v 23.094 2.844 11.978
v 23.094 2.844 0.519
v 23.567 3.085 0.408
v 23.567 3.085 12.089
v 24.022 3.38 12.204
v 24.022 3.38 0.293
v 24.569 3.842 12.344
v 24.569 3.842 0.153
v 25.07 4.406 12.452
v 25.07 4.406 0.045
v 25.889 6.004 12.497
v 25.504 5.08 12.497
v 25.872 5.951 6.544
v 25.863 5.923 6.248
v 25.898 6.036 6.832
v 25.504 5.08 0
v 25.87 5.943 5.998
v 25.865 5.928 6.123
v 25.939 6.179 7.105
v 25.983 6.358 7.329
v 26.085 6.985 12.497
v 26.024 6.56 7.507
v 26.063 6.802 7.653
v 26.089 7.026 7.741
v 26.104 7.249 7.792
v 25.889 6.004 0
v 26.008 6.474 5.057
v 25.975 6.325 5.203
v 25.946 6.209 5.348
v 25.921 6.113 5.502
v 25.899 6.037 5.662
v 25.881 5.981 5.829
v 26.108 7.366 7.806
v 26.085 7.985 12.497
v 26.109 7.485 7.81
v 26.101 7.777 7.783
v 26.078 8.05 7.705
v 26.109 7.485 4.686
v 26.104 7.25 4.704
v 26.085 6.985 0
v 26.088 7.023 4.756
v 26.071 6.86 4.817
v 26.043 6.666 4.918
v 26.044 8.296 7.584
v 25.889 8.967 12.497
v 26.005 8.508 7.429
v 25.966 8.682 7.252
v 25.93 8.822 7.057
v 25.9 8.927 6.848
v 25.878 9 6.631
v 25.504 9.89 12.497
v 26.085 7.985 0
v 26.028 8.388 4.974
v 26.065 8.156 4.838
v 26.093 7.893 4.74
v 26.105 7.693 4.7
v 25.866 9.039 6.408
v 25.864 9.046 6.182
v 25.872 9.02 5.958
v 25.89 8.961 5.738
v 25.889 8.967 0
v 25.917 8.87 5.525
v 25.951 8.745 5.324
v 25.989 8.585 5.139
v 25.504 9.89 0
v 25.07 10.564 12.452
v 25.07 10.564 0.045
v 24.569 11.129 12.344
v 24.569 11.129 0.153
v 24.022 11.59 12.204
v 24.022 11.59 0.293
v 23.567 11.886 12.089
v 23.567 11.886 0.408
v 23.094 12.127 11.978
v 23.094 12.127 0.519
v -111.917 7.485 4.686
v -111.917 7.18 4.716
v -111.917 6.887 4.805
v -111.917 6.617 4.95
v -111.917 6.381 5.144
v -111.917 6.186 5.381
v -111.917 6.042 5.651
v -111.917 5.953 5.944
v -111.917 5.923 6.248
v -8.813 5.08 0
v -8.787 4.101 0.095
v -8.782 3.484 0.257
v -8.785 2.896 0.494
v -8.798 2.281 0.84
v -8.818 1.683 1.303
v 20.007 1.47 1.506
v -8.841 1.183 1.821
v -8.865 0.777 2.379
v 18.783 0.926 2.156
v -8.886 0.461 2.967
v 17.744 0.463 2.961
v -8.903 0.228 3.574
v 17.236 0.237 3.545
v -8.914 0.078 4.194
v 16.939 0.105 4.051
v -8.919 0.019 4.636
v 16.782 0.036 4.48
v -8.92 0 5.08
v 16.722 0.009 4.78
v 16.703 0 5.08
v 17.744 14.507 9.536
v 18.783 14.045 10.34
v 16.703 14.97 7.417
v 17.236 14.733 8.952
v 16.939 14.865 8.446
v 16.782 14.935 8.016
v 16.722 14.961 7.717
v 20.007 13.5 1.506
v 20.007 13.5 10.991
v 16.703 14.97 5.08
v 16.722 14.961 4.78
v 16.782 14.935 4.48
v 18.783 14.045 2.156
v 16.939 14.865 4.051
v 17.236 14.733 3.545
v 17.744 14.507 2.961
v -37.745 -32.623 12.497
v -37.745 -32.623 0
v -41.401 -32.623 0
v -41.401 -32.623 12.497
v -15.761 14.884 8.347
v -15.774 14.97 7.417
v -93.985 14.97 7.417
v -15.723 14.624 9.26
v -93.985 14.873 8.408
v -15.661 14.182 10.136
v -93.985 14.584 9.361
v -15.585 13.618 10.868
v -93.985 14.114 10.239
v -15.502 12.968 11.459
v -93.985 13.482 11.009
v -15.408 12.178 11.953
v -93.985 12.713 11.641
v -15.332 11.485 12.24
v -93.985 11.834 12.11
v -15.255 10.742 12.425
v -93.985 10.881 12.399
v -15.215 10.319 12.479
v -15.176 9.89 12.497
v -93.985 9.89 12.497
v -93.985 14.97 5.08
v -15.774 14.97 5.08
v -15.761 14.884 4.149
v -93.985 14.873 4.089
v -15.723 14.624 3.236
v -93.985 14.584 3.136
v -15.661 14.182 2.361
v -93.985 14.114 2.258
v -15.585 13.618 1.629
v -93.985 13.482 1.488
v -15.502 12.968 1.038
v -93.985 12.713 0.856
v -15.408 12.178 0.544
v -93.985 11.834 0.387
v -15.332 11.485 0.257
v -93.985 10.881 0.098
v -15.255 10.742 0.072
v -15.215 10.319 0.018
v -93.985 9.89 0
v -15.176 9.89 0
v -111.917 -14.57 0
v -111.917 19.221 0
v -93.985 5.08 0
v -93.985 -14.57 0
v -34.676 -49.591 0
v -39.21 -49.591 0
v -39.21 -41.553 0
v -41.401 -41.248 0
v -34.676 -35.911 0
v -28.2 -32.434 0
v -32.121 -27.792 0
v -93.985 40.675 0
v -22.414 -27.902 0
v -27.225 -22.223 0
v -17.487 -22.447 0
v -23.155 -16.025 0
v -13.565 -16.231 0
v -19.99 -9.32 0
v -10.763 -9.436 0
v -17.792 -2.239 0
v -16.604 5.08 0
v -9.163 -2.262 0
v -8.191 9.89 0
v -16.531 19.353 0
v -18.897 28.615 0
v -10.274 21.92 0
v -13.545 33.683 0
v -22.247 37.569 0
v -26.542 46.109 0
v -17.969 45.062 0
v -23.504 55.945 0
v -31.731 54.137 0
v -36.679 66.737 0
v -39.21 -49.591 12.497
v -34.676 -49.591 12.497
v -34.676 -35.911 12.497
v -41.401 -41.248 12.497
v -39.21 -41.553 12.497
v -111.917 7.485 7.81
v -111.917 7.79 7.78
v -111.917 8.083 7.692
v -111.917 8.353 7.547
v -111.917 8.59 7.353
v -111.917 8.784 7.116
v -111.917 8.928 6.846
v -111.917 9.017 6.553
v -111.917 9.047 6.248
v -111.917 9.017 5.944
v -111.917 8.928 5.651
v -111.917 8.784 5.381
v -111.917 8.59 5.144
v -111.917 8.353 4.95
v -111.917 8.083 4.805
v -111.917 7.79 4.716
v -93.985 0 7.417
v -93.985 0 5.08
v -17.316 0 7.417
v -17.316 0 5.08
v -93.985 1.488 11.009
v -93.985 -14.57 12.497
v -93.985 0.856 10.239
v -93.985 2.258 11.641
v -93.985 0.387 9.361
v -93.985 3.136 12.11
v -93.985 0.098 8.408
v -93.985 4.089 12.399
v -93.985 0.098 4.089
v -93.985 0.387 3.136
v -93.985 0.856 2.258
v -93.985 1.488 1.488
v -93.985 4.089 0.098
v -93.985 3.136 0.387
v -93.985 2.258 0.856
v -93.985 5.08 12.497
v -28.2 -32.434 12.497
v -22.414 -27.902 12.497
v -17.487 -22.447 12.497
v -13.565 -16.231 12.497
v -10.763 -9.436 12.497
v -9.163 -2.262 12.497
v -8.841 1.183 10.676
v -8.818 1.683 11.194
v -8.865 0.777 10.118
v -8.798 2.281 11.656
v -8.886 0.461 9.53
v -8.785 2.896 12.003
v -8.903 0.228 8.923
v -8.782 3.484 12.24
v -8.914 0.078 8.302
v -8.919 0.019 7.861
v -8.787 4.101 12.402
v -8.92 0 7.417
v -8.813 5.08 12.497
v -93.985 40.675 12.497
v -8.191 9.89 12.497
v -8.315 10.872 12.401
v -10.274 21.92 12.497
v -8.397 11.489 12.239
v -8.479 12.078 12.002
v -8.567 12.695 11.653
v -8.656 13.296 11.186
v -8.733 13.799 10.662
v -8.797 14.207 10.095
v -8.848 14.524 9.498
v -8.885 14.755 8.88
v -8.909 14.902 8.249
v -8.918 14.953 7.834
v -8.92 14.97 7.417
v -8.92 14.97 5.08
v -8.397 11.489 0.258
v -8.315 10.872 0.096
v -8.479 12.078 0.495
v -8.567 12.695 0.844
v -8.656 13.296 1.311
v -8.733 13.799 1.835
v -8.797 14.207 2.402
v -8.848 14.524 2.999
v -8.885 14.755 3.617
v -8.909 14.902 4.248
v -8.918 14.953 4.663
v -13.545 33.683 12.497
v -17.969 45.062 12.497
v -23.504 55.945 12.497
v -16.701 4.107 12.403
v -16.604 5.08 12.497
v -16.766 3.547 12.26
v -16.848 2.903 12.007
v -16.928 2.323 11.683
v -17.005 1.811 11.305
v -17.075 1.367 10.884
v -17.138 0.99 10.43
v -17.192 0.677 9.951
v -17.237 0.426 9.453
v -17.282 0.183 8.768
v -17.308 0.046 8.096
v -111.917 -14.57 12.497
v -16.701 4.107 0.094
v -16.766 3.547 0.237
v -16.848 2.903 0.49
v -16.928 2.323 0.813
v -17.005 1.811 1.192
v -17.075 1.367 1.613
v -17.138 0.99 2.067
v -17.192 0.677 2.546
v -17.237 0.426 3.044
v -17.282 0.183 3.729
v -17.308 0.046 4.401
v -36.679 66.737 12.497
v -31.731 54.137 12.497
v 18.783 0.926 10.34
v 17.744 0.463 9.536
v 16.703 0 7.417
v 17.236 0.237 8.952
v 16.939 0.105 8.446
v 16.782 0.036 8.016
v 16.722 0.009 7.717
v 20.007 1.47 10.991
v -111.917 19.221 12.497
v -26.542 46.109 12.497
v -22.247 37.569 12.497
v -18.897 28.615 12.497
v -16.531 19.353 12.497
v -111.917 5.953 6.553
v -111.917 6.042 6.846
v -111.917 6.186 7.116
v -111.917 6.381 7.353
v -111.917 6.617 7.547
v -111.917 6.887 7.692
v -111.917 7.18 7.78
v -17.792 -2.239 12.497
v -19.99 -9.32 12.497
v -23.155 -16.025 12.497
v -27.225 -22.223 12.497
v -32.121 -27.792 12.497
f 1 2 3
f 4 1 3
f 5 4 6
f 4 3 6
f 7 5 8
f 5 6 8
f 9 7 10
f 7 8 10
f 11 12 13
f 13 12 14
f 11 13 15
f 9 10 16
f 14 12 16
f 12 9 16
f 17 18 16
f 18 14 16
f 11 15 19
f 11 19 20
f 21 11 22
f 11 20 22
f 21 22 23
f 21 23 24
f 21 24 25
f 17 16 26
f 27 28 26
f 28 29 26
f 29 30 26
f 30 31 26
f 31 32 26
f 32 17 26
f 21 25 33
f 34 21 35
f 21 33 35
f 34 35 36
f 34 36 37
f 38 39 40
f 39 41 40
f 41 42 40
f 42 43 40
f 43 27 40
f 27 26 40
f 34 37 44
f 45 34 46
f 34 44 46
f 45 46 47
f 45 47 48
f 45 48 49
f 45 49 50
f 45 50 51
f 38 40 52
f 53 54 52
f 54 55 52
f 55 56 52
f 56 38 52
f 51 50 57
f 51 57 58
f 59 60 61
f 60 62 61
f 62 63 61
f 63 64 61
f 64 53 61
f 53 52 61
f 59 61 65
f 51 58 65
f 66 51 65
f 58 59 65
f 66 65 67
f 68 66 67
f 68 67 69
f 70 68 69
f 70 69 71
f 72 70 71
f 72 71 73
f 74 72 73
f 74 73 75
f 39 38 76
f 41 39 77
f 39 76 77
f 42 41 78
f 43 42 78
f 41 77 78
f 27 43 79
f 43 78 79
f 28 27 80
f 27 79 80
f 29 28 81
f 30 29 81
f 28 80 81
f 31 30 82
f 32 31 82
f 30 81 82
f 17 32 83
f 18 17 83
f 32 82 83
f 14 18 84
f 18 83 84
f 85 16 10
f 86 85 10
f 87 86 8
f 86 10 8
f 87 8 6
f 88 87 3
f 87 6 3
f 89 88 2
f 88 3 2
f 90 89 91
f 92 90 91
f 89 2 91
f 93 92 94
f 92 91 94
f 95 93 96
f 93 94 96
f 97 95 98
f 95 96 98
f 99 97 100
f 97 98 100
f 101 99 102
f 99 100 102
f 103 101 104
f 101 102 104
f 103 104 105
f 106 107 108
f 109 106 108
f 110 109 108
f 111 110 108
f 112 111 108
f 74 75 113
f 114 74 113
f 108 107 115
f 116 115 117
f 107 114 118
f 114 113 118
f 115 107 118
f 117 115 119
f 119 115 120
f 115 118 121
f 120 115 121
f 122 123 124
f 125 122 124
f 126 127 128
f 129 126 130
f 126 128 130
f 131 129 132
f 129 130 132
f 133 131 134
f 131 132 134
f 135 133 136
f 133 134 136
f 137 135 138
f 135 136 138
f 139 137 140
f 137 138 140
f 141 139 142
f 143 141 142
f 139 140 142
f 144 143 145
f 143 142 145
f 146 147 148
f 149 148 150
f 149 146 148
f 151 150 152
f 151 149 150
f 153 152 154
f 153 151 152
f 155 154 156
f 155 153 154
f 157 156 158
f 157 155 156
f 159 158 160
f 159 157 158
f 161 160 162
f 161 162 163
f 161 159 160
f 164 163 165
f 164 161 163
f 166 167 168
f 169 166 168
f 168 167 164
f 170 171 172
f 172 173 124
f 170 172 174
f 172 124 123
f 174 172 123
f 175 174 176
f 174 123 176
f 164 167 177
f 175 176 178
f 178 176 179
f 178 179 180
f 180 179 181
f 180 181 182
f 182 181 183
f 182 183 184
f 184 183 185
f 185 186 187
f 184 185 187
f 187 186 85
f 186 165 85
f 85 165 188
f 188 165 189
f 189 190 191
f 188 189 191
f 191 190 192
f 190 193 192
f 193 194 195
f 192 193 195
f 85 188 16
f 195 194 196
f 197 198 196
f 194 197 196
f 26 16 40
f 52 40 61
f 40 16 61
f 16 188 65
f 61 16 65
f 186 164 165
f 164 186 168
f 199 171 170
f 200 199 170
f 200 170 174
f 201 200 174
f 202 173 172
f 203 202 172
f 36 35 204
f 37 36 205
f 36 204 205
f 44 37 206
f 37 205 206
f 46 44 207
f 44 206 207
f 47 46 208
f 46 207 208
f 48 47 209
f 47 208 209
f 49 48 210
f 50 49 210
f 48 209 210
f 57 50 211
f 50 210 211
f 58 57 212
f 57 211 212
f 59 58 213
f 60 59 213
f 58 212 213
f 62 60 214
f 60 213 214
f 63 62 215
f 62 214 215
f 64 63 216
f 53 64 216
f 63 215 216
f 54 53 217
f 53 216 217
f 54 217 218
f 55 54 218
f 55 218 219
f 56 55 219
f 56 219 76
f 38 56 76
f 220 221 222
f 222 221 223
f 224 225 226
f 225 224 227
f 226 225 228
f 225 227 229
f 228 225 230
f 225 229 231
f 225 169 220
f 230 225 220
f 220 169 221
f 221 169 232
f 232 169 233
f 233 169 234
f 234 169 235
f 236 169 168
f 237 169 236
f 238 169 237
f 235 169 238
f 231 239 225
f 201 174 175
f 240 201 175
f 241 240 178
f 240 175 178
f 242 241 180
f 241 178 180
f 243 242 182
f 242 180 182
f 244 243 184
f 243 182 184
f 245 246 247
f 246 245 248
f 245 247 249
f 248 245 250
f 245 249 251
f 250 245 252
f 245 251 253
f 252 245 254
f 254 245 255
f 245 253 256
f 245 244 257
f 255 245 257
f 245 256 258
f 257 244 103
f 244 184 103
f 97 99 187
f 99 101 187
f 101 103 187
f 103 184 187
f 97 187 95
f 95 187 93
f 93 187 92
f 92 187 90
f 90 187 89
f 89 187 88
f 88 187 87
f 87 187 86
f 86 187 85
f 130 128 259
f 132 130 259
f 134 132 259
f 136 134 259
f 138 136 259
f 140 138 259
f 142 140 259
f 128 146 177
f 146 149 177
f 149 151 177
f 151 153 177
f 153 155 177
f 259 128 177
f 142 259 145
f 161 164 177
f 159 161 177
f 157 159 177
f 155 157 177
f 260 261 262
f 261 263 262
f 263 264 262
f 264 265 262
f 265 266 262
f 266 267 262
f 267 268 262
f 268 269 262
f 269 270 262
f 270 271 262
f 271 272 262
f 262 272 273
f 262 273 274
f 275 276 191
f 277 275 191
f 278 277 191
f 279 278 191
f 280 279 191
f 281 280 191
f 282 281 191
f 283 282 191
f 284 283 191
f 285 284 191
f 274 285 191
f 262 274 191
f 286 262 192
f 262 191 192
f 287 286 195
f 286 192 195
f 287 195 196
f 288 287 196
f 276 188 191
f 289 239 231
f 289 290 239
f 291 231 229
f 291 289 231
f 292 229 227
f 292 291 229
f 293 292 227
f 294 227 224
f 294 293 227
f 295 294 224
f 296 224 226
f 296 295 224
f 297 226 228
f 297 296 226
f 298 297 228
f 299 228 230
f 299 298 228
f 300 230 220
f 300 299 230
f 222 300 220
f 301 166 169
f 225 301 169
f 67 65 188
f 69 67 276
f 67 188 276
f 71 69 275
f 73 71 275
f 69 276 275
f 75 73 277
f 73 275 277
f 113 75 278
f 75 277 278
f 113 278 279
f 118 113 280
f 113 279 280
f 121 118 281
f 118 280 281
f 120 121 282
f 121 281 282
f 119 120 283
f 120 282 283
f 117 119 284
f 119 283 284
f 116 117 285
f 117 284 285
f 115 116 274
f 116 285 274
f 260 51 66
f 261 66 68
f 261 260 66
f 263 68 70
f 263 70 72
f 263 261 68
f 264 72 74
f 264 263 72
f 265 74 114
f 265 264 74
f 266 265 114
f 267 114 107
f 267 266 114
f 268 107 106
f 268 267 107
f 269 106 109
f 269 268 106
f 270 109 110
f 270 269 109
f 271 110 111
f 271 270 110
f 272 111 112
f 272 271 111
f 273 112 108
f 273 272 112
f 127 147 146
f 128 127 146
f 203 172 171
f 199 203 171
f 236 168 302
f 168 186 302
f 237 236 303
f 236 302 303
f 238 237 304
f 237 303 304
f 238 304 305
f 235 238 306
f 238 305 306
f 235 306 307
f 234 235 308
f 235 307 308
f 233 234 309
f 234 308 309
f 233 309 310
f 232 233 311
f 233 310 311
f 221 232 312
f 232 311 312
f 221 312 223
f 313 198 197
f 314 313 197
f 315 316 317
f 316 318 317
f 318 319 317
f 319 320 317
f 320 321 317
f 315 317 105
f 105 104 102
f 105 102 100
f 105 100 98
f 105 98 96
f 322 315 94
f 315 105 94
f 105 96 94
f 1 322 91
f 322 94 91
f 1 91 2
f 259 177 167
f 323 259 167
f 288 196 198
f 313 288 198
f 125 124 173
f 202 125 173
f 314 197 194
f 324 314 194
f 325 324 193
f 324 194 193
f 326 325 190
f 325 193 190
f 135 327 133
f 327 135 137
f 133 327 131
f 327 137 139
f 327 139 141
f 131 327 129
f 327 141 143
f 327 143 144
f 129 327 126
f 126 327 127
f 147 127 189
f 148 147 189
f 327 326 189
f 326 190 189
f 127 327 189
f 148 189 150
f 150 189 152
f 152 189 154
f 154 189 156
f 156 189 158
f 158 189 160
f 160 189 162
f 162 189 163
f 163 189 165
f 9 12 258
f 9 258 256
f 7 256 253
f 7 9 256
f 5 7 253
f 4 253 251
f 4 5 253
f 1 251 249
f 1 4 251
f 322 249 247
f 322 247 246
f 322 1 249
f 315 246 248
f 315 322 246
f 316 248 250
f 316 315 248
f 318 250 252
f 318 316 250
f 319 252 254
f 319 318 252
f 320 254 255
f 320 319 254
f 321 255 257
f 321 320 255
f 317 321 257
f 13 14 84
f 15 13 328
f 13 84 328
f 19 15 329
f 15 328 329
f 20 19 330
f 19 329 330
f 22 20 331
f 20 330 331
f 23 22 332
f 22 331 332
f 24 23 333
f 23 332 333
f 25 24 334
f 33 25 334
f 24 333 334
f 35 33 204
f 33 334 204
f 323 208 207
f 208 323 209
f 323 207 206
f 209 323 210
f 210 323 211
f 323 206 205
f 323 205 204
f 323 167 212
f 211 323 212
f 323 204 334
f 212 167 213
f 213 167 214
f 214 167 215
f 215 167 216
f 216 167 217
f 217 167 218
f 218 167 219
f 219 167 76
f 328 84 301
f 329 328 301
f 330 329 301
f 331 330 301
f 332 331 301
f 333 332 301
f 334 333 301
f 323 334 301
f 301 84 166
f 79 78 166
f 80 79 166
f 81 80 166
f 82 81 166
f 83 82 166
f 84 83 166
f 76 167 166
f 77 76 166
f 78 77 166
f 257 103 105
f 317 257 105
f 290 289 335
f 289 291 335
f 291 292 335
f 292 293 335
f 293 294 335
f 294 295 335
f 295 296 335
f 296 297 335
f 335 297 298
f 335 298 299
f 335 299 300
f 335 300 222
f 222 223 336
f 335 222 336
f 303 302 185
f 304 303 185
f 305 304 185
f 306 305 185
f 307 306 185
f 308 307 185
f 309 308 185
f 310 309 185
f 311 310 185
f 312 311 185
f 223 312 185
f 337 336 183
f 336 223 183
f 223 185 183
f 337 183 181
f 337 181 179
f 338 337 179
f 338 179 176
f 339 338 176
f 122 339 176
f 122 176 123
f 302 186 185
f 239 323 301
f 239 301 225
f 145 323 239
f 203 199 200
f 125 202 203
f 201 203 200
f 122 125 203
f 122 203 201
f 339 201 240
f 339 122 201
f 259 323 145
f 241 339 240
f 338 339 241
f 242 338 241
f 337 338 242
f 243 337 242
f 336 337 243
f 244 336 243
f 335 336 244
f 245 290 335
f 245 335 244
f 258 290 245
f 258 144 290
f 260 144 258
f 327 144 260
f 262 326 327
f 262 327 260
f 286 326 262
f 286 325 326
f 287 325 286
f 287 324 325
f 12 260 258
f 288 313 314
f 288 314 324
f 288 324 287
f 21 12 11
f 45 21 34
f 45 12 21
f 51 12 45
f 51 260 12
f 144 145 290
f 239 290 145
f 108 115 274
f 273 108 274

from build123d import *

# Parameters (mm, degrees)
F1_DEPTH    = 12.4968
F3_DEPTH    = 152.4
F4_T1_DEPTH = 61.7762374031
F5_R        = 5.08


# Not quite as in the source:
# - a fillet or chamfer that OpenCascade refuses, or shapes differently, is made with other operations: its cross-section is extruded or revolved along the edge and cut away or added
# - a feature names something its author has since deleted; it is built from what else it names


with BuildPart() as f1:
    # F0 (on Top) → F1 (new body)
    with BuildSketch(Plane.XY):
        with BuildLine():
            Line((-93.9849921167, 7.4851757918), (-16.1919427612, 7.4851757918))
            ThreePointArc((-16.1919427612, 7.4851757918), (-15.8959532901, 11.2229099464), (-15.7736930996, 14.9703515835))
            Line((-15.7736930996, 14.9703515835), (-93.9849921167, 14.9703515835))
            Line((-93.9849921167, 14.9703515835), (-93.9849921167, 7.4851757918))
        make_face()
        with BuildLine():
            Line((-93.9849921167, 0), (-17.3162451786, 0))
            ThreePointArc((-17.3162451786, 0), (-16.6663908007, 3.7294145399), (-16.1919427612, 7.4851757918))
            Line((-16.1919427612, 7.4851757918), (-93.9849921167, 7.4851757918))
            Line((-93.9849921167, 7.4851757918), (-93.9849921167, 0))
        make_face()
        Polygon((-93.9849921167, -14.5700745956), (-93.9849921167, 0), (-93.9849921167, 7.4851757918), (-93.9849921167, 14.9703515835), (-93.9849921167, 40.6753872946), (-111.9173921167, 19.2205523892), (-111.9173921167, 14.5700745956), (-111.9173921167, -14.5700745956), align=None)
        with BuildLine():
            Line((-15.7736930996, 14.9703515835), (-8.9203921167, 14.9703515835))
            ThreePointArc((-8.9203921167, 14.9703515835), (-14.3796310702, 36.1097695722), (-23.5038306564, 55.9447705746))
            Line((-23.5038306564, 55.9447705746), (-36.6789735854, 66.7365342379))
            Line((-36.6789735854, 66.7365342379), (-31.7310467362, 54.1373938322))
            ThreePointArc((-31.7310467362, 54.1373938322), (-21.3821676169, 35.5195355237), (-15.7736930996, 14.9703515835))
        make_face()
        with BuildLine():
            Line((-17.3162451786, 0), (-8.9203921167, 0))
            ThreePointArc((-8.9203921167, 0), (-8.270322019, 3.7175238692), (-8.0526666958, 7.4851757917))
            Line((-8.0526666958, 7.4851757918), (-16.1919427612, 7.4851757918))
            ThreePointArc((-16.1919427612, 7.4851757918), (-16.6663908007, 3.7294145399), (-17.3162451786, 0))
        make_face()
        with BuildLine():
            Line((-16.1919427612, 7.4851757918), (-8.0526666958, 7.4851757918))
            ThreePointArc((-8.0526666958, 7.4851757917), (-8.270322019, 11.2528277143), (-8.9203921167, 14.9703515835))
            Line((-8.9203921167, 14.9703515835), (-15.7736930996, 14.9703515835))
            ThreePointArc((-15.7736930996, 14.9703515835), (-15.8959532901, 11.2229099464), (-16.1919427612, 7.4851757918))
        make_face()
        with BuildLine():
            ThreePointArc((-34.6760861576, -35.9113998711), (-16.812117143, -21.5317519133), (-8.9203921167, 0))
            Line((-8.9203921167, 0), (-17.3162451786, 0))
            ThreePointArc((-17.3162451786, 0), (-24.4639001208, -18.231884723), (-37.7452522516, -32.6227247715))
            Line((-37.7452522516, -32.6227247715), (-41.4012260735, -32.6227247715))
            Line((-41.4012260735, -32.6227247715), (-41.4012260735, -41.2478148937))
            Line((-41.4012260735, -41.2478148937), (-39.2100475191, -41.5528100016))
            Line((-39.2100475191, -41.5528100016), (-39.2100475191, -49.5910942554))
            Line((-39.2100475191, -49.5910942554), (-34.6760861576, -49.5910942554))
            Line((-34.6760861576, -49.5910942554), (-34.6760861576, -35.9113998711))
        make_face()
        with BuildLine():
            ThreePointArc((-8.9203921167, 14.9703515835), (-8.270322019, 11.2528277143), (-8.0526666958, 7.4851757917))
            Line((-8.0526666958, 7.4851757918), (16.7025048286, 7.4851757918))
            Line((16.7025048286, 7.4851757918), (16.7025048286, 14.9703515835))
            Line((16.7025048286, 14.9703515835), (-8.9203921167, 14.9703515835))
        make_face()
        with BuildLine():
            ThreePointArc((-8.0526666958, 7.4851757917), (-8.270322019, 3.7175238692), (-8.9203921167, 0))
            Line((-8.9203921167, 0), (16.7025048286, 0))
            Line((16.7025048286, 0), (16.7025048286, 7.4851757918))
            Line((16.7025048286, 7.4851757918), (-8.0526666958, 7.4851757918))
        make_face()
        Polygon((16.7025048286, 7.4851757918), (16.7025048286, 0), (33.5264503956, 7.4851757918), (16.7025048286, 14.9703515835), align=None)
    extrude(amount=F1_DEPTH)

    # F2 (on face) → F3 (cut)
    with BuildSketch(Plane(origin=(-111.9173921167, 0, 0), x_dir=(0, -1, 0), z_dir=(-1, 0, 0))):
        with BuildLine():
            ThreePointArc((-5.9230757918, 6.2484), (-6.3806042889, 7.3529715029), (-7.4851757918, 7.8105))
            Line((-7.4851757918, 7.8105), (-7.4851757918, 4.6863))
            ThreePointArc((-7.4851757918, 4.6863), (-6.3806042889, 5.1438284971), (-5.9230757918, 6.2484))
        make_face()
        with BuildLine():
            Line((-7.4851757918, 4.6863), (-7.4851757918, 7.8105))
            ThreePointArc((-7.4851757918, 7.8105), (-9.0472757918, 6.2484), (-7.4851757918, 4.6863))
        make_face()
    extrude(amount=-F3_DEPTH, mode=Mode.SUBTRACT)

    # F4: fillet of radius 5.08 on 1 edges, made by hand

    # F4_s2 → F4_t1 (cut)
    with BuildSketch(Plane.XY.offset(-28.5449687015)):
        with BuildLine():
            ThreePointArc((23.0943727233, 2.843818927), (26.1093772139, 7.4851757918), (23.0943727233, 12.1265326565))
            Line((23.0943727233, 12.1265326565), (33.5264503956, 7.4851757918))
            Line((33.5264503956, 7.4851757918), (23.0943727233, 2.843818927))
        make_face()
    extrude(amount=F4_T1_DEPTH, mode=Mode.SUBTRACT)

    # F5
    f5_edges = [f1.edges().sort_by_distance(p)[0] for p in [
        (3.891056, 0, 12.4968),
        (3.891056, 14.970352, 12.4968),
        (3.891056, 0, 0),
        (3.891056, 14.970352, 0),
        (-54.879343, 14.970352, 12.4968),
        (-55.650619, 0, 12.4968),
        (-55.650619, 0, 0),
        (-54.879343, 14.970352, 0),
    ]]
    fillet(f5_edges, radius=F5_R)


solid = f1.part
